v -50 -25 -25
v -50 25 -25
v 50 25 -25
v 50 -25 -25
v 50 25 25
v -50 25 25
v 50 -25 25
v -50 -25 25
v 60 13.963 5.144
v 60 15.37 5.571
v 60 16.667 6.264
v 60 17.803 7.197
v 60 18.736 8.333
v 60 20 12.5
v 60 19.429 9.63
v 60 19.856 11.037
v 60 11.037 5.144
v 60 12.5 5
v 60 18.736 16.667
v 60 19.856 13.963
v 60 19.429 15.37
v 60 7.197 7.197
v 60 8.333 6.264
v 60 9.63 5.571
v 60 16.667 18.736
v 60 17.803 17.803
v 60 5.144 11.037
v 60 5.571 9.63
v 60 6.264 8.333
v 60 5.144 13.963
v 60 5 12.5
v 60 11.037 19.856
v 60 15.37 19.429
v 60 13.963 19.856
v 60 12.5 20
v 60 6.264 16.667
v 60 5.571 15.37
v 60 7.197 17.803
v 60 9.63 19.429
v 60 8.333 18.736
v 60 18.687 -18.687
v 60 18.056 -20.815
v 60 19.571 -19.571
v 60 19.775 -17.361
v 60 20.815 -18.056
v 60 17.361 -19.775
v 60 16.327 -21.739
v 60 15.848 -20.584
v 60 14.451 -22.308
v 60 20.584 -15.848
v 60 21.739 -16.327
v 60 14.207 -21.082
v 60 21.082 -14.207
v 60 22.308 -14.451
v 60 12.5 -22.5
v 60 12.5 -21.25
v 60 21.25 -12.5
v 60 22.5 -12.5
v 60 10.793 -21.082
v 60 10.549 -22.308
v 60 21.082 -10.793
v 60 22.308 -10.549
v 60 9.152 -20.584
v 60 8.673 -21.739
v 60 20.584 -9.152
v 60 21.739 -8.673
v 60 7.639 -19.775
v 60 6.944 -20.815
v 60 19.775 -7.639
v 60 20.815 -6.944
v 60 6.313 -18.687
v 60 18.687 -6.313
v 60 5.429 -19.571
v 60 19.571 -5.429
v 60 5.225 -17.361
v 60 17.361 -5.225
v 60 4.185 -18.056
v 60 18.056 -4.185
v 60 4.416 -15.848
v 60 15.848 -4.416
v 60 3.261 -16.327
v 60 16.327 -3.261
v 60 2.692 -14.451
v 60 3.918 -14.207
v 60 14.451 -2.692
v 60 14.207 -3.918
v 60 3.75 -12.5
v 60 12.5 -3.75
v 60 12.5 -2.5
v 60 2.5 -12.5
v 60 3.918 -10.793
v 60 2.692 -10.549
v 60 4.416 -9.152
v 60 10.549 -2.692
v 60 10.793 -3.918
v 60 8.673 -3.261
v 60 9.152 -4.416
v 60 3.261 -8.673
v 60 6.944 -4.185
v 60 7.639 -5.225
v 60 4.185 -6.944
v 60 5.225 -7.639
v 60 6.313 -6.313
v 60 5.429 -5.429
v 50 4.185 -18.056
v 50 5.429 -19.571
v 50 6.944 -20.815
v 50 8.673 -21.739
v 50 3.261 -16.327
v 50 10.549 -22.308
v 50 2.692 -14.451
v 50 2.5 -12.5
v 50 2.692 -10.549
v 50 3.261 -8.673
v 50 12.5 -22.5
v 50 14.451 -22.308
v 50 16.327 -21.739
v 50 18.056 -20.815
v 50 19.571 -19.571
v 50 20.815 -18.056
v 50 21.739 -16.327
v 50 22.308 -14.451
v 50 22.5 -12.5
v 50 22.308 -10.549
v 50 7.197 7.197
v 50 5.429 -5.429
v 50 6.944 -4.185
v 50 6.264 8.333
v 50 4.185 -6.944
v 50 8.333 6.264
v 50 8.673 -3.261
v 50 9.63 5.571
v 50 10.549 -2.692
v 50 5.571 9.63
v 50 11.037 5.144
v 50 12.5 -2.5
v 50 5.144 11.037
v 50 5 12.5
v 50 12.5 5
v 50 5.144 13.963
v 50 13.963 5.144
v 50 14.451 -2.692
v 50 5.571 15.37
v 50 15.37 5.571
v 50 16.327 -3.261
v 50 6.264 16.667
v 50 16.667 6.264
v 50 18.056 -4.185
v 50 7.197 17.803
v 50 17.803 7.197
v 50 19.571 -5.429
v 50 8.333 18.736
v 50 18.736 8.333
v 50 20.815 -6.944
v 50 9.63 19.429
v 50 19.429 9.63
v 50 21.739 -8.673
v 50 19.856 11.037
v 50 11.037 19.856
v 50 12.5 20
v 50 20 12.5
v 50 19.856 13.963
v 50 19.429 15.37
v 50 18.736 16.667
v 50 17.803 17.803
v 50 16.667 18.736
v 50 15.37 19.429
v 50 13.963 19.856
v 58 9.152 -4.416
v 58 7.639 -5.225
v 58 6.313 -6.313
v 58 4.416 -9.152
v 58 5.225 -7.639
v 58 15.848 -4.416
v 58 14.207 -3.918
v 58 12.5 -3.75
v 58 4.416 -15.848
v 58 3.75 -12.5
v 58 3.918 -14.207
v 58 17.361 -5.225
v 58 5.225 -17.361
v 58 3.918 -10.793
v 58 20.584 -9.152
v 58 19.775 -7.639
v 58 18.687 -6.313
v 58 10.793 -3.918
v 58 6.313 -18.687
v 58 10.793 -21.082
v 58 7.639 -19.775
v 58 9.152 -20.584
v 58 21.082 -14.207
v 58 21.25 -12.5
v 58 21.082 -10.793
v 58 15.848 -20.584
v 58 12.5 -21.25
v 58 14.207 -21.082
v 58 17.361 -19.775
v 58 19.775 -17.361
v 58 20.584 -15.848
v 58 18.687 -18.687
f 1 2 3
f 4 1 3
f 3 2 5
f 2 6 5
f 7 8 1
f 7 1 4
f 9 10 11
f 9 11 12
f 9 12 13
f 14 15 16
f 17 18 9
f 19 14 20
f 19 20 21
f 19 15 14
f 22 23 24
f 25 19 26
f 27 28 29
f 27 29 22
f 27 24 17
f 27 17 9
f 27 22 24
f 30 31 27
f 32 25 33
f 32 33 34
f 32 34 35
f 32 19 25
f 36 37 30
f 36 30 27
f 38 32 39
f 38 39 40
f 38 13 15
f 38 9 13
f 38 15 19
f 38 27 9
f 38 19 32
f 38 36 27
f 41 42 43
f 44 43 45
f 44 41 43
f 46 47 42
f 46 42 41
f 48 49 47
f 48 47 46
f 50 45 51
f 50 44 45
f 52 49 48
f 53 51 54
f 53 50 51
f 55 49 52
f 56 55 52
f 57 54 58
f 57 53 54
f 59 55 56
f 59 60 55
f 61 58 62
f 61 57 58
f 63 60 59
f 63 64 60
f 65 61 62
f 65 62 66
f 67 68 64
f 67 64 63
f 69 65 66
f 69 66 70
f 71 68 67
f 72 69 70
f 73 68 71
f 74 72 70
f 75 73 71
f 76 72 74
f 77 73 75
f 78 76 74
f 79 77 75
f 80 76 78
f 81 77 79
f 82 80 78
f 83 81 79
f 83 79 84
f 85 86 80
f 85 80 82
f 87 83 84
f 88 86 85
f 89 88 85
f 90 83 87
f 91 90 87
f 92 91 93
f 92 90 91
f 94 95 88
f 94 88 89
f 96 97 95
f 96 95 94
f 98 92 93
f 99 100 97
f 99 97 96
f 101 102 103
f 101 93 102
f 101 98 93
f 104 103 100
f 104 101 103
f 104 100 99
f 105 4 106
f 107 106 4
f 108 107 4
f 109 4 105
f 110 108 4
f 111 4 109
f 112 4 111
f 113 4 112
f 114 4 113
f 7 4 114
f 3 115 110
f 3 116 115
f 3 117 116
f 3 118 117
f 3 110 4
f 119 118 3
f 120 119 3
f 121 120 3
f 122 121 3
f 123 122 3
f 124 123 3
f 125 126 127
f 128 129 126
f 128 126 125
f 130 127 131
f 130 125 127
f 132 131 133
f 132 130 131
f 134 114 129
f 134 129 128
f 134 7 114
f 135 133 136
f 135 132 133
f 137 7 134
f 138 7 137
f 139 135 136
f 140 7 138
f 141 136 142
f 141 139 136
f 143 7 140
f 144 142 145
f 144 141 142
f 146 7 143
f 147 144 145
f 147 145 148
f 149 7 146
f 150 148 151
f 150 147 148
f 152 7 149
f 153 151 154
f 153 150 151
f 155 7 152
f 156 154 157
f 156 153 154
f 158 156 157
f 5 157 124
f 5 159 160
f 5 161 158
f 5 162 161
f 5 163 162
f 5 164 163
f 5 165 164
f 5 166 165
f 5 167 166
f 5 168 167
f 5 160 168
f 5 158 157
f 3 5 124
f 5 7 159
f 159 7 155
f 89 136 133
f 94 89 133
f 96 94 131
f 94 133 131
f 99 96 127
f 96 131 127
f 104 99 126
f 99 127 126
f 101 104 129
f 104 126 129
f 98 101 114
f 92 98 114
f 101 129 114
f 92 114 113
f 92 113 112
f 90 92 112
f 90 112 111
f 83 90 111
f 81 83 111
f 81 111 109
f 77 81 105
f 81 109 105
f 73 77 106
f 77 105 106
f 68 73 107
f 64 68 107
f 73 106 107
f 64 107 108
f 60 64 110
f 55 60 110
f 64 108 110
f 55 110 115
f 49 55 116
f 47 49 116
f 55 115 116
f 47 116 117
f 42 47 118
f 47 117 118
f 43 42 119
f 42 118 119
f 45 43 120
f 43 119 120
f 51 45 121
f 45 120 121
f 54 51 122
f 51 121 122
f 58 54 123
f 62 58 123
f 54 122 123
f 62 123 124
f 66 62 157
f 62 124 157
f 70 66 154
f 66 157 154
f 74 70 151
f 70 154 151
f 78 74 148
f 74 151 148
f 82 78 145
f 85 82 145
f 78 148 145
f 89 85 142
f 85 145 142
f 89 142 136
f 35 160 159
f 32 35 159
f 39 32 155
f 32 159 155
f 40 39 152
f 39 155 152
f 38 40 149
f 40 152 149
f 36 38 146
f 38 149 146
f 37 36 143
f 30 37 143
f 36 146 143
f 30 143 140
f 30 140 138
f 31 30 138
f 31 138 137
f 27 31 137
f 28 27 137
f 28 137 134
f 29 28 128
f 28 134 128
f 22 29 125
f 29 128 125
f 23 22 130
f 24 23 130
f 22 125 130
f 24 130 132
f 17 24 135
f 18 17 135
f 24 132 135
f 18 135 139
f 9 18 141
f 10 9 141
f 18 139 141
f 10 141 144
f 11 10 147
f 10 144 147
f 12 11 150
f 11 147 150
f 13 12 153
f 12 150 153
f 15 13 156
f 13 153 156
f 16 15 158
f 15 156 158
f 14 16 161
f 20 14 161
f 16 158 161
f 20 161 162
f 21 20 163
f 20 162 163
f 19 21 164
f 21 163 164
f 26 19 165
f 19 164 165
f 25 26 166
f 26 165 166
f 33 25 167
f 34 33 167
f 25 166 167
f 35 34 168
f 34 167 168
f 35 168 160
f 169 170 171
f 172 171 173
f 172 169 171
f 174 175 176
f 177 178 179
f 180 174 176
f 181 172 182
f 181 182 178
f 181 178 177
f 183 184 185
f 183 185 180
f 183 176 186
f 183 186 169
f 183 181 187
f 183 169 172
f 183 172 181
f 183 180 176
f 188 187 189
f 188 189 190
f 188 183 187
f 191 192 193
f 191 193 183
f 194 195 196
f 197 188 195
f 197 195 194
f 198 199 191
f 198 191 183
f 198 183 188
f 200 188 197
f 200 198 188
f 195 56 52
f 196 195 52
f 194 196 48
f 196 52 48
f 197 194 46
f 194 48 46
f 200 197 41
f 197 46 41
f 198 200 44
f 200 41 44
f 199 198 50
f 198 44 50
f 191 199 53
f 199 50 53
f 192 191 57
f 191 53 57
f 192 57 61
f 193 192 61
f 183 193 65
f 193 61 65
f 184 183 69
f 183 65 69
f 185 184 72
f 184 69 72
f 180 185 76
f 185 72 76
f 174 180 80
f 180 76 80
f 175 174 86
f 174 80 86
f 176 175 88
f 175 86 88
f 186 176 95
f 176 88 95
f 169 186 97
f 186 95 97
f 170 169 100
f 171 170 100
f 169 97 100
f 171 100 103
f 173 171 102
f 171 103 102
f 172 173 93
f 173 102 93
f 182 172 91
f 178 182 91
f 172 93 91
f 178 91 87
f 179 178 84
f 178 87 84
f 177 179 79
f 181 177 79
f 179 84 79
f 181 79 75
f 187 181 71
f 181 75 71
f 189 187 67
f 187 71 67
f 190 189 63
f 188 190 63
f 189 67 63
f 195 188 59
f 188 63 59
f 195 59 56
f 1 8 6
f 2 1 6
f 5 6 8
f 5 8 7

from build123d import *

# Parameters (mm, degrees)
SKETCH_1_W          = 100
SKETCH_1_H          = 50
EXTRUDE_1_DEPTH     = 25
SKETCH_2_R          = 10
SKETCH_2_R_2        = 7.5
EXTRUDE_2_DEPTH     = 10
SKETCH_3_R          = 8.75
CUT_EXTRUDE_1_DEPTH = 2


with BuildPart() as part:
    # 스케치1 → 보스-돌출1 (new, symmetric)
    with BuildSketch(Plane.XY):
        Rectangle(SKETCH_1_W, SKETCH_1_H)
    extrude(amount=EXTRUDE_1_DEPTH, both=True)

    # 스케치2 → 보스-돌출2 (add)
    with BuildSketch(Plane(origin=(50, 0, 0), x_dir=(0, 0, -1), z_dir=(1, 0, 0))):
        with Locations(Location((12.5, 12.5, 0), (0, 0, 180))):
            Circle(SKETCH_2_R)
        with Locations(Location((-12.5, 12.5, 0), (0, 0, 180))):
            Circle(SKETCH_2_R_2)
    extrude(amount=EXTRUDE_2_DEPTH)

    # 스케치3 → 컷-돌출1 (cut)
    with BuildSketch(Plane(origin=(60, 0, 0), x_dir=(0, 0, -1), z_dir=(1, 0, 0))):
        with Locations((12.5, 12.5)):
            Circle(SKETCH_3_R)
    extrude(amount=-CUT_EXTRUDE_1_DEPTH, mode=Mode.SUBTRACT)


solid = part.part
